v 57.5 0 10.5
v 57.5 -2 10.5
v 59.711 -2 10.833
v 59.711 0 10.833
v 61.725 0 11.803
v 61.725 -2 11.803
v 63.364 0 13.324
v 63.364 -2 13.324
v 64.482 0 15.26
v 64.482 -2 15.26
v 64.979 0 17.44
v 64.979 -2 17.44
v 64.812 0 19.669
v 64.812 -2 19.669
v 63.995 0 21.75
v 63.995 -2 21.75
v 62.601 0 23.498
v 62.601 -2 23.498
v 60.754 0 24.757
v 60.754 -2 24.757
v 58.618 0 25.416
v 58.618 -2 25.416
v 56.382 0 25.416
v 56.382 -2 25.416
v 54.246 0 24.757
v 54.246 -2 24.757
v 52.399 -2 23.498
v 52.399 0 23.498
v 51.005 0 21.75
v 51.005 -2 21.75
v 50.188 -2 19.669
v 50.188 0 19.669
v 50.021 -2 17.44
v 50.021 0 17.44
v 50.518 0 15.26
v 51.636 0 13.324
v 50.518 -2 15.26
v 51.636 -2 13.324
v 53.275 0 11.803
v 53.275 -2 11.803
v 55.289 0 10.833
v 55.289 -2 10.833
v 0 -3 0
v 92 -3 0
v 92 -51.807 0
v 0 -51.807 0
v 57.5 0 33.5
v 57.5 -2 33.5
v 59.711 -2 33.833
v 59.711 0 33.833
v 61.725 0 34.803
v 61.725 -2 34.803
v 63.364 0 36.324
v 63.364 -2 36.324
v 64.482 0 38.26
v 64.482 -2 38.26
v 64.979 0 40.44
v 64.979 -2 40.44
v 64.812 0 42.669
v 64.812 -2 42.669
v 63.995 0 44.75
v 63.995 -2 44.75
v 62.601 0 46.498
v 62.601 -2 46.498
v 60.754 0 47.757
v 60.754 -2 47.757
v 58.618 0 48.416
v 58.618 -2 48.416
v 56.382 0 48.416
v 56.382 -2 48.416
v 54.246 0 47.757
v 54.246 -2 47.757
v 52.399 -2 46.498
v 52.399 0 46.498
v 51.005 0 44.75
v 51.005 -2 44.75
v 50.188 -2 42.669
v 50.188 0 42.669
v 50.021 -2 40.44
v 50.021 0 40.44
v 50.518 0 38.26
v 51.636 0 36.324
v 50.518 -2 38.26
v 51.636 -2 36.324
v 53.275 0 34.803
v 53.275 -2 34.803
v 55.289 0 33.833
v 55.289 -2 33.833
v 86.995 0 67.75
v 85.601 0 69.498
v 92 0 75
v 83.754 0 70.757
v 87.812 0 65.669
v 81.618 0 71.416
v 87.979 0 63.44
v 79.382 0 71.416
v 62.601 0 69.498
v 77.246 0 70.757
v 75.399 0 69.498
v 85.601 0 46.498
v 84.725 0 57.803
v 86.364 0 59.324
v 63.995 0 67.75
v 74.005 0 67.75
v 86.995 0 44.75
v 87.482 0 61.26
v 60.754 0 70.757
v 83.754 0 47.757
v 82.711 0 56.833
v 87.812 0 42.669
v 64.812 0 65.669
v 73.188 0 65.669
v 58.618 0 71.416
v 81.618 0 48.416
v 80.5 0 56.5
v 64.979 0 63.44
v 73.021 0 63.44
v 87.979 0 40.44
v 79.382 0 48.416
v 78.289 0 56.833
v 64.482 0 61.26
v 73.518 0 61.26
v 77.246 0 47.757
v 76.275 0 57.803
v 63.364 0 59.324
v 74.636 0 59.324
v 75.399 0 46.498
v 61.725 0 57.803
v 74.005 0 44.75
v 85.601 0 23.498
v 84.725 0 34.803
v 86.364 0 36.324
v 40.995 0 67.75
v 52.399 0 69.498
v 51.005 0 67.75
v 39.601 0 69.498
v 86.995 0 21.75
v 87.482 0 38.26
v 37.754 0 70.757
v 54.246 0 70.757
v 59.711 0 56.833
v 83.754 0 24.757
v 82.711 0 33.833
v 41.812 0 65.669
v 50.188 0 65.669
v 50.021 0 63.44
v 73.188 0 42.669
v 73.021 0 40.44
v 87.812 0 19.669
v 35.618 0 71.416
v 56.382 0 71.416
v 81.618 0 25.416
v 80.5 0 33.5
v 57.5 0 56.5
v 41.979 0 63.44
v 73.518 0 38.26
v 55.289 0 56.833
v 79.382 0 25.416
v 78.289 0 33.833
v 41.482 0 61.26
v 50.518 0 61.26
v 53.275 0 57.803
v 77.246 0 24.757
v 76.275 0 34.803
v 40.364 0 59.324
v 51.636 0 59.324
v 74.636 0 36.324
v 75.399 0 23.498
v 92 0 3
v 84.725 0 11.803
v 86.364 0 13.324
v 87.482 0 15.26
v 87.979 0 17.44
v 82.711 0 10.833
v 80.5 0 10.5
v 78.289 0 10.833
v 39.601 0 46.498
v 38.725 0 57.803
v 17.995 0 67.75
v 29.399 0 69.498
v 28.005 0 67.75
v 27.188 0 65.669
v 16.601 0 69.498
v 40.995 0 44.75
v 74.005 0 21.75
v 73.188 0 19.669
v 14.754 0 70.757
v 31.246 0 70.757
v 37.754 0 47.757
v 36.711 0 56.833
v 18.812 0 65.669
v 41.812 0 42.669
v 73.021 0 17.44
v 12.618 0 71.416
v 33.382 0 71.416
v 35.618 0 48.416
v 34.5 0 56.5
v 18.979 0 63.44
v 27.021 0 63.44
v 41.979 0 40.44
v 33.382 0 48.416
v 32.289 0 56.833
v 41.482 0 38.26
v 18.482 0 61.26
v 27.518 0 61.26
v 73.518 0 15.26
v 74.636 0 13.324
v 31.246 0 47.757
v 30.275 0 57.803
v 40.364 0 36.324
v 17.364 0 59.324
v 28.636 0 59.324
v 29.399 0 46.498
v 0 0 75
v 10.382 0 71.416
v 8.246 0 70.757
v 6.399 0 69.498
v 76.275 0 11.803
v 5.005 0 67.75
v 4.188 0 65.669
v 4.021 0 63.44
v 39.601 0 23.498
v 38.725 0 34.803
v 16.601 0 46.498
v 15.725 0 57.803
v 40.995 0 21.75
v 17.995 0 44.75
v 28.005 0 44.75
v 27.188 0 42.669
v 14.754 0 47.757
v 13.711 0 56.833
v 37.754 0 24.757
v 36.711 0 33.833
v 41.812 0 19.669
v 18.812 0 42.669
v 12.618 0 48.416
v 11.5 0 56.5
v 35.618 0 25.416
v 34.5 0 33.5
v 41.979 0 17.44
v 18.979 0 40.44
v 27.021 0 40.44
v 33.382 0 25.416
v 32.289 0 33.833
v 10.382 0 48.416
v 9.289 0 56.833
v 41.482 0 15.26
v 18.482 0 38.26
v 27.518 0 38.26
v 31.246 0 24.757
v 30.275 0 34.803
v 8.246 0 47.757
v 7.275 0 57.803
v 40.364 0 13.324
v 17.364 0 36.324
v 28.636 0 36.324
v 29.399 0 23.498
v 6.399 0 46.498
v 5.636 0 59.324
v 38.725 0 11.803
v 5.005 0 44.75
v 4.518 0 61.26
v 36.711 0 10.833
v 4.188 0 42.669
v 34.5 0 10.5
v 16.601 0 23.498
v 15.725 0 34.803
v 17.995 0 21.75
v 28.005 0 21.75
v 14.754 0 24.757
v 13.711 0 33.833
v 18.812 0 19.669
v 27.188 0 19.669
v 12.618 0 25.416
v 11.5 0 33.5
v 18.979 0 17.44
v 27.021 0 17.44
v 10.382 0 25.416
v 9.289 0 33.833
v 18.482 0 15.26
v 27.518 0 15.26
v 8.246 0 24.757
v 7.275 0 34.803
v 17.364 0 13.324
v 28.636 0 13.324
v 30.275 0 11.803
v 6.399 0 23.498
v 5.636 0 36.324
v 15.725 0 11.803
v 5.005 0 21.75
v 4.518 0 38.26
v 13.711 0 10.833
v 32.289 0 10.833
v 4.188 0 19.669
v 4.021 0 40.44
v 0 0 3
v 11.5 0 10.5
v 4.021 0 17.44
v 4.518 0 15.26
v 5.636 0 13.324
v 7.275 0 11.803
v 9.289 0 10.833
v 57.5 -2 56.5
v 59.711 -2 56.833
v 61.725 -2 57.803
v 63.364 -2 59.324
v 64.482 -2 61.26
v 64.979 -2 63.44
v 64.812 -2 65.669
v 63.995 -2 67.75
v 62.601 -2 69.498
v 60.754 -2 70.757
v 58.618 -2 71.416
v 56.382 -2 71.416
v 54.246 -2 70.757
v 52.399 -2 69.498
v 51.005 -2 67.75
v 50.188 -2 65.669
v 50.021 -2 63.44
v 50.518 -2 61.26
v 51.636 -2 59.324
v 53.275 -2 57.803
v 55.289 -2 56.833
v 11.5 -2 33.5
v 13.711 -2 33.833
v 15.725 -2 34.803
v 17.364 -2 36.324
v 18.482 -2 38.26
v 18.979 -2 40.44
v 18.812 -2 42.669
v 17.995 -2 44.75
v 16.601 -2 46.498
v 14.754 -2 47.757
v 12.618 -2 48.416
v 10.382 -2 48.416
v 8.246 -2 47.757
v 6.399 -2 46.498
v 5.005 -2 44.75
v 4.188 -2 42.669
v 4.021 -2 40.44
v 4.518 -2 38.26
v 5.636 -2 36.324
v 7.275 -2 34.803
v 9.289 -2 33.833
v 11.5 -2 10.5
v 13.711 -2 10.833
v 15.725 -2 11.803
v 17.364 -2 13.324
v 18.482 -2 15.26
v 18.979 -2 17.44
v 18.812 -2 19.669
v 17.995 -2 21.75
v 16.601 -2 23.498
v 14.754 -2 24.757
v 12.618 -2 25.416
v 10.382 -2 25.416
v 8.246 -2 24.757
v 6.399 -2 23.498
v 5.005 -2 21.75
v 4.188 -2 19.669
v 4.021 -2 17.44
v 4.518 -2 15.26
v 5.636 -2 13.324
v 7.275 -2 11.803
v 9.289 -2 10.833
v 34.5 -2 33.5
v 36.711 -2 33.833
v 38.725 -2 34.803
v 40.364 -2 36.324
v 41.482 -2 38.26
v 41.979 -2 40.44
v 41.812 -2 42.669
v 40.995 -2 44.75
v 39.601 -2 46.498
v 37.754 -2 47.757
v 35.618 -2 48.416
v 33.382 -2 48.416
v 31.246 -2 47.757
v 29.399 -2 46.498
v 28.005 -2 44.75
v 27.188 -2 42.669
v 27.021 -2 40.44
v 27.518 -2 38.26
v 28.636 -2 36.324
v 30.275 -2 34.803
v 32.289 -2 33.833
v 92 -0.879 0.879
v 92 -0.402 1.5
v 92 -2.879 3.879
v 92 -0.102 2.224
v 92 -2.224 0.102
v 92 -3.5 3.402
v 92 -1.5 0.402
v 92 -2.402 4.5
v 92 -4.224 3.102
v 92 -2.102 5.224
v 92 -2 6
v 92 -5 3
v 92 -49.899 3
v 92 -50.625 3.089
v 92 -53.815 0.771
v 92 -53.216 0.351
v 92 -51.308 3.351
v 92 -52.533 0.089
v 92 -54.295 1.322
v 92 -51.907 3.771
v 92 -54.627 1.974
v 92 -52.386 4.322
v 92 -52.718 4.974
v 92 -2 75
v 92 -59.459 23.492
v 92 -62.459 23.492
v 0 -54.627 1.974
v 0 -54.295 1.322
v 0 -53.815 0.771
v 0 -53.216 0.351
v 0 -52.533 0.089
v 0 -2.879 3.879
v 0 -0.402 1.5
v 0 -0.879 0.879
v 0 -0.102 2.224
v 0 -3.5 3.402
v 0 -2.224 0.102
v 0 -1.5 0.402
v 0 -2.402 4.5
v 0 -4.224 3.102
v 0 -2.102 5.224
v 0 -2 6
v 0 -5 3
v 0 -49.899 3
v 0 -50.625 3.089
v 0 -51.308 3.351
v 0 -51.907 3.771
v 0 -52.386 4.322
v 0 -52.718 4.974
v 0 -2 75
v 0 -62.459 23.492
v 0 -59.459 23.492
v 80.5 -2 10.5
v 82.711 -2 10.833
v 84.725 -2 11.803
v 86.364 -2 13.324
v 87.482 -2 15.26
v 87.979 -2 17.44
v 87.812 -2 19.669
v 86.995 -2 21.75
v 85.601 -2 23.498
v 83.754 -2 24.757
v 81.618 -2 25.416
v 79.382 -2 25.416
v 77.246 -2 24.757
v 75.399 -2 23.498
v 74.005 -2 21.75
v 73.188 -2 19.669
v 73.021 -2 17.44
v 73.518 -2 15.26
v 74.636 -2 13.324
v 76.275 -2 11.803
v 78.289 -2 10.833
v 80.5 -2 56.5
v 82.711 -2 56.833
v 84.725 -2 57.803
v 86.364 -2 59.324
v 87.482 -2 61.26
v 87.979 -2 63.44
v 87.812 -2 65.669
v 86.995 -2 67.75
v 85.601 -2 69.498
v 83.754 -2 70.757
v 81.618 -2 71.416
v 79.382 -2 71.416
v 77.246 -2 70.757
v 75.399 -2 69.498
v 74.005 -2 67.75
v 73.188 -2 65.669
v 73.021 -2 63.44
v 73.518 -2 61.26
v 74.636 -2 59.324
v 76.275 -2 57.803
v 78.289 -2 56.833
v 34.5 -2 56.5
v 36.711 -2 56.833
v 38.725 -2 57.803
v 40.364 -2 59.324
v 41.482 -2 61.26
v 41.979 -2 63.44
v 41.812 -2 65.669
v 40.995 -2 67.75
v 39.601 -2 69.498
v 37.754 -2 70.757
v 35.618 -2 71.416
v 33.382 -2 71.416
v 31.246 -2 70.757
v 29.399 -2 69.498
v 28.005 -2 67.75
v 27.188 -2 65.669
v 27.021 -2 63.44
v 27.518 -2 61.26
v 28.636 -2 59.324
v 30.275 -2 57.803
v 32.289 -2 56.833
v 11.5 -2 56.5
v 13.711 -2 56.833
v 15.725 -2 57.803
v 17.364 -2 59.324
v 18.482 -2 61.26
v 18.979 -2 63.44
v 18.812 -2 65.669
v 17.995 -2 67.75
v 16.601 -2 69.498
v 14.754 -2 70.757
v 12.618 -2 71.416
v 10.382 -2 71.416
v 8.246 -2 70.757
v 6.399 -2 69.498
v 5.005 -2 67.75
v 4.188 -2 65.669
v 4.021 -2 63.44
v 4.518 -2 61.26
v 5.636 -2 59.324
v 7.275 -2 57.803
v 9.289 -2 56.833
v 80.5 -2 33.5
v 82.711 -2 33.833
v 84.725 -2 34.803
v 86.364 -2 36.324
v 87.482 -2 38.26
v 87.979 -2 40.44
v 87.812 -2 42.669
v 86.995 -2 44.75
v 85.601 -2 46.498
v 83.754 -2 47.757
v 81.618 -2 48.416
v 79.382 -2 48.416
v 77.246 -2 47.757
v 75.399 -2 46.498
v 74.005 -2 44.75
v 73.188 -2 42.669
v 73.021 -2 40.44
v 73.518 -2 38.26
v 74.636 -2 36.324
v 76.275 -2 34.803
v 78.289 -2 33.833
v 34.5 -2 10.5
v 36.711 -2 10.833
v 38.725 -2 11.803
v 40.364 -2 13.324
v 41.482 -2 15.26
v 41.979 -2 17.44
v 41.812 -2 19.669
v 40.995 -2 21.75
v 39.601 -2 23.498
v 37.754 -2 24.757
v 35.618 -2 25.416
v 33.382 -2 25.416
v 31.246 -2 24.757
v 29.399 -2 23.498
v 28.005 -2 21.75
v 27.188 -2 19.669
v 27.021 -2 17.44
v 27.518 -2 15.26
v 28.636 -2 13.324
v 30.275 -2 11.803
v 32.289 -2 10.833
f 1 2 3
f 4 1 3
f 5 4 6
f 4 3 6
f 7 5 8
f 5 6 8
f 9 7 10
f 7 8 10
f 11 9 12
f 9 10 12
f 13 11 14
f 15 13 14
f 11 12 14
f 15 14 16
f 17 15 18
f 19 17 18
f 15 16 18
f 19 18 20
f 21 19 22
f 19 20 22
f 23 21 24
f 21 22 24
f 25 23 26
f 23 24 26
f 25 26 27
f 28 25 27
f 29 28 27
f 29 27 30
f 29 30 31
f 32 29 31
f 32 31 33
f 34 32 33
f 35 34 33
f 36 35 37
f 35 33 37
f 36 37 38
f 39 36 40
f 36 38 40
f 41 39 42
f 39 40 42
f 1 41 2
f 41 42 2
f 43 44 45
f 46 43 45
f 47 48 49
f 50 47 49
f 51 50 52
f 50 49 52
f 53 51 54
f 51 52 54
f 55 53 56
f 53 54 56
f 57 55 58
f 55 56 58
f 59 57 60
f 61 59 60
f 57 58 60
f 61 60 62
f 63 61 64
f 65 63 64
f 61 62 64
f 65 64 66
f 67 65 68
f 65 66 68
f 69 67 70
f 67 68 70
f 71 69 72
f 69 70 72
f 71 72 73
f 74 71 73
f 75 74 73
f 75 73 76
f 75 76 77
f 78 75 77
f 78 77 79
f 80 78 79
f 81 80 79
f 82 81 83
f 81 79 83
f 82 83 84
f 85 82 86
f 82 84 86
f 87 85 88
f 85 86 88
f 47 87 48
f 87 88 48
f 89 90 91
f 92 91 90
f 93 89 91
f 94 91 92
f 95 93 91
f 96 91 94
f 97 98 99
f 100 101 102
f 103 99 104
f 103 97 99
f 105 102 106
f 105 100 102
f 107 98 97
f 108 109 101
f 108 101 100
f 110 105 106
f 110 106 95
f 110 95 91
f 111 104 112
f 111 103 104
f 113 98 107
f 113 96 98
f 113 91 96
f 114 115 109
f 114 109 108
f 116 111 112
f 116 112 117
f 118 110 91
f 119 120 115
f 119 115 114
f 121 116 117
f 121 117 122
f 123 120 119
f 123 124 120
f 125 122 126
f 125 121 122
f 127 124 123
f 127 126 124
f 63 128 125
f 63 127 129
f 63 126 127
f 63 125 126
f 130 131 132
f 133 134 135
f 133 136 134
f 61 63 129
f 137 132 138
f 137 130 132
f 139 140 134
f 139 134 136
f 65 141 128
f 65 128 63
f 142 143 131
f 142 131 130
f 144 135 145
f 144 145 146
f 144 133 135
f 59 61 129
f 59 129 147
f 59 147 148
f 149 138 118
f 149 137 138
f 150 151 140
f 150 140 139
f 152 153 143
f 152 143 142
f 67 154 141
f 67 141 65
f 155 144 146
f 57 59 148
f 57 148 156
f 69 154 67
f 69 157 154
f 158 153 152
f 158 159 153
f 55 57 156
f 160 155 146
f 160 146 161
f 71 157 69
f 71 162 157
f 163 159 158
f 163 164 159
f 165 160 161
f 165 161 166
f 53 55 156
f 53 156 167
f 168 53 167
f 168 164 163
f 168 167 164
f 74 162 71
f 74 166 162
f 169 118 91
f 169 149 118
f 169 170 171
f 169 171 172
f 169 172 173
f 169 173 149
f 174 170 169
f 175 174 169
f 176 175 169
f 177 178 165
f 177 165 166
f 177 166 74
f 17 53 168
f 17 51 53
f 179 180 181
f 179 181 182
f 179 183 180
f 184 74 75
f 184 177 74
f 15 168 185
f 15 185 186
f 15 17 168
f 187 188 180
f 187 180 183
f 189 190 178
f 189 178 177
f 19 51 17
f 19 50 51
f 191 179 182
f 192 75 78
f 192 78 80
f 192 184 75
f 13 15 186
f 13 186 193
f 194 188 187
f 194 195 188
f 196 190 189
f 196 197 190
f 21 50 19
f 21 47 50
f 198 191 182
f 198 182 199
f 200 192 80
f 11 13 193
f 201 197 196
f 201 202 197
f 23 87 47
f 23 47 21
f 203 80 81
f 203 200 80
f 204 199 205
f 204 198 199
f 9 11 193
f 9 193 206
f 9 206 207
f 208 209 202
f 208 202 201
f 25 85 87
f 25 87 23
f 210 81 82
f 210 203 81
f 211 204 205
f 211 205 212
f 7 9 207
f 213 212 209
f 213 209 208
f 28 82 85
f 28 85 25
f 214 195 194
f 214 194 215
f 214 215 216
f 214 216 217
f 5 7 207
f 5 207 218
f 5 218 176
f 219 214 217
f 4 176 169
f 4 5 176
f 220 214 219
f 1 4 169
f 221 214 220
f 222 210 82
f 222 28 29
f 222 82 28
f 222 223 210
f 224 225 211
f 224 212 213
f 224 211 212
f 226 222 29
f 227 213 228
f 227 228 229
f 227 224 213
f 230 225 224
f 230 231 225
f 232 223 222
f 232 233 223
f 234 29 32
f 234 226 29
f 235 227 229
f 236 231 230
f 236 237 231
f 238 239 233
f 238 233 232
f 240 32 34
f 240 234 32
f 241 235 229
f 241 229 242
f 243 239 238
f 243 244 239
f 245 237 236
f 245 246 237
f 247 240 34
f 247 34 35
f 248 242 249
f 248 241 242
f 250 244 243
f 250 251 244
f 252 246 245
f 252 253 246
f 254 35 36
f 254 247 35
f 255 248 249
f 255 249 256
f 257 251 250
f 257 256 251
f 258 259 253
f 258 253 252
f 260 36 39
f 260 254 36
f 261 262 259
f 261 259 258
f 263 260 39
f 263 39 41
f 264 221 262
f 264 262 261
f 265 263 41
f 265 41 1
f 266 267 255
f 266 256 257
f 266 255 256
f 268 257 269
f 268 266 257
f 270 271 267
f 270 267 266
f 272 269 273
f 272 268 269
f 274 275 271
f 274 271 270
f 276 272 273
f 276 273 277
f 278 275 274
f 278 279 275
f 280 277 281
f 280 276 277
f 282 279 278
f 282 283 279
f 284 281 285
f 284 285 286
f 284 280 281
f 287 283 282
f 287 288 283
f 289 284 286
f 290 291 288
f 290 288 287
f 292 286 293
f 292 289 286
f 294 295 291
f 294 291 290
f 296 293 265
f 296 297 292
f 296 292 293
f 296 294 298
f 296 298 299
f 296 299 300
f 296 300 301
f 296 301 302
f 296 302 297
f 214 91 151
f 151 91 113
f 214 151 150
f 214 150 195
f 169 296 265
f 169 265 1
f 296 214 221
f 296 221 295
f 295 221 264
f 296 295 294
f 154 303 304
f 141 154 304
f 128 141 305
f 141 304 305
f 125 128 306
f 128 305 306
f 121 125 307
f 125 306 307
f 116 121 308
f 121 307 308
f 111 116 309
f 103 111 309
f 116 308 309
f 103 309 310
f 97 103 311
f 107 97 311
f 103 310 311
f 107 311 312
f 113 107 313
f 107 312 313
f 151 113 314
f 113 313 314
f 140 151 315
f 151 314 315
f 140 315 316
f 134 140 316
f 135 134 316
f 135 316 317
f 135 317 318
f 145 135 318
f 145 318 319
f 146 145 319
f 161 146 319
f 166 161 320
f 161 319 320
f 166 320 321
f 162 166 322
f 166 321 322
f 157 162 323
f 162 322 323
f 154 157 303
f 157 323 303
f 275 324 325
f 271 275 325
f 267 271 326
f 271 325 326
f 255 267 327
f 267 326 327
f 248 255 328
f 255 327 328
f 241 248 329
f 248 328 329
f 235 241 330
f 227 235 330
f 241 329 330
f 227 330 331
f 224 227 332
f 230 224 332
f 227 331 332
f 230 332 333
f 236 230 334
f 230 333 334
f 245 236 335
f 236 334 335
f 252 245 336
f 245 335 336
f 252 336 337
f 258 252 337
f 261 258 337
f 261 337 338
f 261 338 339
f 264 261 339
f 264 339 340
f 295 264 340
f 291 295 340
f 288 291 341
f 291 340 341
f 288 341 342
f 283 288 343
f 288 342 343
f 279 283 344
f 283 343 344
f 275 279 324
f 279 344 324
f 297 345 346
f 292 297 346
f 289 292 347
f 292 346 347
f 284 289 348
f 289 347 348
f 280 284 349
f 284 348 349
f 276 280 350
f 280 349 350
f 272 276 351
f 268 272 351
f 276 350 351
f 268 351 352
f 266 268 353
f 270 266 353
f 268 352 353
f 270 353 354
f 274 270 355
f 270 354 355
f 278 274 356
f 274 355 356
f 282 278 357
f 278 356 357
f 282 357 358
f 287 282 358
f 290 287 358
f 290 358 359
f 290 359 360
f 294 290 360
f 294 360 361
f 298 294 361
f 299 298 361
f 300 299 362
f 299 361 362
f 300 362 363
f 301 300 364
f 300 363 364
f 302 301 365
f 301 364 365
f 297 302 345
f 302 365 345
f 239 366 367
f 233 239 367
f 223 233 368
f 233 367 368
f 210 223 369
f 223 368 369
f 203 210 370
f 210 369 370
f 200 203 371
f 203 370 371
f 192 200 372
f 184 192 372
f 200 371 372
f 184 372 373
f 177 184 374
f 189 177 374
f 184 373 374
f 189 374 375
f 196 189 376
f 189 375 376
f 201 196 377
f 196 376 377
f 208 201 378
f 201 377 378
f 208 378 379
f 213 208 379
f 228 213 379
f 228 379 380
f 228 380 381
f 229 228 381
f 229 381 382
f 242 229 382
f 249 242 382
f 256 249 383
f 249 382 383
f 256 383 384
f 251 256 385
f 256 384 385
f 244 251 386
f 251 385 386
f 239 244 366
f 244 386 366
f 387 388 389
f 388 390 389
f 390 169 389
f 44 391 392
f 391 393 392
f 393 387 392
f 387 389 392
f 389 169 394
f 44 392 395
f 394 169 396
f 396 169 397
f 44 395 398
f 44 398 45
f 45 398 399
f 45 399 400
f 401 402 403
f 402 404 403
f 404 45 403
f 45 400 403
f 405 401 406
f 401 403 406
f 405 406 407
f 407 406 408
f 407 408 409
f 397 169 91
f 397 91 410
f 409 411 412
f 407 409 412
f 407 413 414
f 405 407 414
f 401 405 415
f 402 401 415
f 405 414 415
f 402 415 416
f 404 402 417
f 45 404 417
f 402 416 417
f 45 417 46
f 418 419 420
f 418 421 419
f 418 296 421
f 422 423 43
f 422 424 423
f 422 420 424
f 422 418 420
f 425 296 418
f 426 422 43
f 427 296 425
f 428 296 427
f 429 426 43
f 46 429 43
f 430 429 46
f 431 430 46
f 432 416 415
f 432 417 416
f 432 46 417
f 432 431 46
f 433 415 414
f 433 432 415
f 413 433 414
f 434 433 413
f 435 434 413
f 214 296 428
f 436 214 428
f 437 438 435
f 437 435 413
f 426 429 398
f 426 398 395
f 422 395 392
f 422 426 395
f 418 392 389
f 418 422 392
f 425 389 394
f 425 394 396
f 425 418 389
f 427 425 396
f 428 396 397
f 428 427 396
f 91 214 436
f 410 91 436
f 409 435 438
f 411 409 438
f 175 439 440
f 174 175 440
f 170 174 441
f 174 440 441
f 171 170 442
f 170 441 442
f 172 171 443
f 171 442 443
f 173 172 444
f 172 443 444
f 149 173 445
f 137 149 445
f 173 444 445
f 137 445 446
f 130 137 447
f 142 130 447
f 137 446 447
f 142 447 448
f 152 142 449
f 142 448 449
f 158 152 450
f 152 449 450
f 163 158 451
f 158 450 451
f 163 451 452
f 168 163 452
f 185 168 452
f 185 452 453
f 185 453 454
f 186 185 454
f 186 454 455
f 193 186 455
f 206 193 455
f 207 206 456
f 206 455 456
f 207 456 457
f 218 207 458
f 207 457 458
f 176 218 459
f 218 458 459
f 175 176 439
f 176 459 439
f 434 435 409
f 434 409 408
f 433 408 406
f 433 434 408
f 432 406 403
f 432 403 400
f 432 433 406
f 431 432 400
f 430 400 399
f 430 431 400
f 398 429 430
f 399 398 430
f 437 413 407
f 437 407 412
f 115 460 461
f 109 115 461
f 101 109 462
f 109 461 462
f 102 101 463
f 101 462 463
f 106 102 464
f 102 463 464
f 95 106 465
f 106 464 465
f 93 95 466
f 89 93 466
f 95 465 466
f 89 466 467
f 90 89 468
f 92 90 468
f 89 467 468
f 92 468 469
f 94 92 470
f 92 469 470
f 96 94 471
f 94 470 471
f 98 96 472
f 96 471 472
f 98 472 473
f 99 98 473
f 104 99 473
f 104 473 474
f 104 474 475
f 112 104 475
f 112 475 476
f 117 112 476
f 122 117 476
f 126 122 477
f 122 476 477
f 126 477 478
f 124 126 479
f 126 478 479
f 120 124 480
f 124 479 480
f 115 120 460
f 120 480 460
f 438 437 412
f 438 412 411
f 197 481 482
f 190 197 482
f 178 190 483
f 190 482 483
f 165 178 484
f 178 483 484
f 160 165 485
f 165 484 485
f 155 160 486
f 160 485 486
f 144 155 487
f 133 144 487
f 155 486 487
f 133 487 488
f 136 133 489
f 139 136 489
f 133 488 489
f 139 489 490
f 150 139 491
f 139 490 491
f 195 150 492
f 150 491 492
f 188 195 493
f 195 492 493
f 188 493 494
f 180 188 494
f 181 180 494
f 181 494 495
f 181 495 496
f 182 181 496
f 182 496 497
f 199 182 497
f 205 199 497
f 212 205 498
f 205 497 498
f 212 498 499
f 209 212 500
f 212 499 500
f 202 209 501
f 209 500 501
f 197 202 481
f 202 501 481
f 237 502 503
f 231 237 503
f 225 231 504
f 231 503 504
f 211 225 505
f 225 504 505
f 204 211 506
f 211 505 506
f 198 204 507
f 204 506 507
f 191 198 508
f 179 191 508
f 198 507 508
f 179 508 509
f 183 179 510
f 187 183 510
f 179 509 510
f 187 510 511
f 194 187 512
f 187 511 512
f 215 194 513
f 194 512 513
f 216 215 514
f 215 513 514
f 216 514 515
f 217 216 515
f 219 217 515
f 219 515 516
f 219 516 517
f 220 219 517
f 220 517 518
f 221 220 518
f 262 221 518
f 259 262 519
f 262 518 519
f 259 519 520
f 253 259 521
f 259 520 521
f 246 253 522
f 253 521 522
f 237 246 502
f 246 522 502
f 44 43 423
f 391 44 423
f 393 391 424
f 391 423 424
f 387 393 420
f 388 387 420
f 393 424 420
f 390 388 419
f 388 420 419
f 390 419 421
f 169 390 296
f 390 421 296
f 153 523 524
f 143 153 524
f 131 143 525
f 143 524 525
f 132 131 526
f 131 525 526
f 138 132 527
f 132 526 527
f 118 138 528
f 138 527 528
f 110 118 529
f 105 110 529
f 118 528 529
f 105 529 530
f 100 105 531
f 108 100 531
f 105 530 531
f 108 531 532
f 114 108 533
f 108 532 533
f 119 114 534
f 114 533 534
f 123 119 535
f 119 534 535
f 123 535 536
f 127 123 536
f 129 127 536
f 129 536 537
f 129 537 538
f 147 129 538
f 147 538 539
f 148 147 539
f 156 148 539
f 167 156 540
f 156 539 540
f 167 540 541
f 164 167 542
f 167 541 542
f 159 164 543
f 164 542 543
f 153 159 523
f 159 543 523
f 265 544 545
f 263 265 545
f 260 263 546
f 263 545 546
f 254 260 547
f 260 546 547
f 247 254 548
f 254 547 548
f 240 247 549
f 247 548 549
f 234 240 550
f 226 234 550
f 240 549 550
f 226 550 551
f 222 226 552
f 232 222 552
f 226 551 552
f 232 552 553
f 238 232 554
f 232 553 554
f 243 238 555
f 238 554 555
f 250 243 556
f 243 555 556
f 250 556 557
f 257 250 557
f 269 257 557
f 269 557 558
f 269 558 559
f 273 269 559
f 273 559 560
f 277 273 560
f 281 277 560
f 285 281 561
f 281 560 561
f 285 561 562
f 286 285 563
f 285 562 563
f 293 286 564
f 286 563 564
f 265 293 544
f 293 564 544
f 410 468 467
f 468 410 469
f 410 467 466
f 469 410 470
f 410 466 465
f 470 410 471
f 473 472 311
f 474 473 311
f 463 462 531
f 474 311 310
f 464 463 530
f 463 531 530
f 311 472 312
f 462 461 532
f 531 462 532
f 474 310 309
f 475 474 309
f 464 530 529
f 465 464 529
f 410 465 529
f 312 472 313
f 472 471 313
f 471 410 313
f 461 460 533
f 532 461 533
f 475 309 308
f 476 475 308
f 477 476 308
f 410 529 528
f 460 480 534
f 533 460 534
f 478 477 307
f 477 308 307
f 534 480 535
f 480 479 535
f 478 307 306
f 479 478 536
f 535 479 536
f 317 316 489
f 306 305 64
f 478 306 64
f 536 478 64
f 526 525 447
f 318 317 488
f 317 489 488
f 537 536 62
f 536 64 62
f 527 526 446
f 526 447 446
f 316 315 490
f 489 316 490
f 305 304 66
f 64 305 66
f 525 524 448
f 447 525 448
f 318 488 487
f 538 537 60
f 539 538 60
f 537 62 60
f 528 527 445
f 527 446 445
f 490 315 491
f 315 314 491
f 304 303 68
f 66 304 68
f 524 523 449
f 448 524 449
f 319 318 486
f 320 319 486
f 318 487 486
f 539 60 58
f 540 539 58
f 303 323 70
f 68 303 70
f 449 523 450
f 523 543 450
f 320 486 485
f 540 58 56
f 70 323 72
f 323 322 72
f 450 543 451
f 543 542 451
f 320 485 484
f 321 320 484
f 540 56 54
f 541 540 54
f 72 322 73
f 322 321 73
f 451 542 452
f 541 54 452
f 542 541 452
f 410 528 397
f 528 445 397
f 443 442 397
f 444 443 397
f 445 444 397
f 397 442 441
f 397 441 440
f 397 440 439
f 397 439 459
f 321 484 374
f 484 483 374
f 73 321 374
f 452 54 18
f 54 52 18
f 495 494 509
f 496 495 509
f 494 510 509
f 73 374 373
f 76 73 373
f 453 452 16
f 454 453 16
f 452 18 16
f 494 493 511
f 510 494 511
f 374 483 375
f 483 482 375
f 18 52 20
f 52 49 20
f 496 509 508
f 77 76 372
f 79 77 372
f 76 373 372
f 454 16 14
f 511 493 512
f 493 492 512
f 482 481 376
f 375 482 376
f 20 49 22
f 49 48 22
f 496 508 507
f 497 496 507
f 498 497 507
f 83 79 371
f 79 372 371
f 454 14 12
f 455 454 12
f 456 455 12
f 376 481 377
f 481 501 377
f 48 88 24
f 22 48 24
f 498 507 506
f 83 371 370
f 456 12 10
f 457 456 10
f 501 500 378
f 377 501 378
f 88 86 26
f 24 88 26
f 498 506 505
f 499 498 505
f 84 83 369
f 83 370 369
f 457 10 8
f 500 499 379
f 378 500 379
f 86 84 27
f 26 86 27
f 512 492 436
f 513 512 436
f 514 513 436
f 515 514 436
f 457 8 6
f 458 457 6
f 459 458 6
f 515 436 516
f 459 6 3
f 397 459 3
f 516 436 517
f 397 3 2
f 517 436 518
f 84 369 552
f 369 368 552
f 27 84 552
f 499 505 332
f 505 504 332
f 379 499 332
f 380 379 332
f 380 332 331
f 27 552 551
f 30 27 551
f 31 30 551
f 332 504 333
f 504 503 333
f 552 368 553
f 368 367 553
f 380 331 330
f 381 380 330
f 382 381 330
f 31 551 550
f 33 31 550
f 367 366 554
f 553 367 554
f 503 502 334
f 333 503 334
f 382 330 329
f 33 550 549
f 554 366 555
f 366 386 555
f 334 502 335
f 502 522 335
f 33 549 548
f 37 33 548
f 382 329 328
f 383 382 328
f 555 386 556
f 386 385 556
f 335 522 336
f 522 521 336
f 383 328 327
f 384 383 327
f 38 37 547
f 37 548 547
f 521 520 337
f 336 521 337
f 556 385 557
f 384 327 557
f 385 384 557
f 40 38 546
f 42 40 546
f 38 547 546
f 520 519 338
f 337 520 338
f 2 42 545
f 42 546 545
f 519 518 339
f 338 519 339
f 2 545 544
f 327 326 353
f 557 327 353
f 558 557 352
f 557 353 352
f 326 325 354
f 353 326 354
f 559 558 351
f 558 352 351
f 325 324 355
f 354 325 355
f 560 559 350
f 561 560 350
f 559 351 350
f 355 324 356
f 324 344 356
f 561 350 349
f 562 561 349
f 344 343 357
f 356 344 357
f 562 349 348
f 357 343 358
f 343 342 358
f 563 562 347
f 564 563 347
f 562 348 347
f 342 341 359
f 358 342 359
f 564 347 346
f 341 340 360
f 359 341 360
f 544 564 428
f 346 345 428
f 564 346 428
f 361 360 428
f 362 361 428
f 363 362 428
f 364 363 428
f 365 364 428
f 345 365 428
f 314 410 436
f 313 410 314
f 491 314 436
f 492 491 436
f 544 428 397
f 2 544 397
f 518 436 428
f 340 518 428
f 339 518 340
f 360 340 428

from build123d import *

# Parameters (mm, degrees)
PAD_DEPTH    = 92
SKETCH001_R  = 7.5
POCKET_DEPTH = 2


with BuildPart() as part:
    # Sketch → Pad (new body)
    with BuildSketch(Plane.YZ):
        with BuildLine():
            Line((0, 75), (0, 3))
            ThreePointArc((-3, 0), (-0.87868, 0.87868), (0, 3))
            Line((-3, 0), (-51.807467, 0))
            ThreePointArc((-54.626545, 1.97394), (-53.528196, 0.542544), (-51.807467, 0))
            Line((-54.626545, 1.97394), (-62.458589, 23.492317))
            Line((-62.458589, 23.492317), (-59.458589, 23.492317))
            Line((-52.718455, 4.97394), (-59.458589, 23.492317))
            ThreePointArc((-52.718455, 4.97394), (-51.620107, 3.542544), (-49.899377, 3))
            Line((-5, 3), (-49.899377, 3))
            ThreePointArc((-5, 3), (-2.87868, 3.87868), (-2, 6))
            Line((-2, 75), (-2, 6))
            Line((0, 75), (-2, 75))
        make_face()
    extrude(amount=PAD_DEPTH)

    # Sketch001 (on Face12 of Pad) → Pocket (cut)
    with BuildSketch(Plane(origin=(0, -2, 0), x_dir=(0, 0, -1), z_dir=(0, -1, 0))):
        with Locations((-64, 11.5)):
            Circle(SKETCH001_R)
        with Locations((-41, 11.5)):
            Circle(SKETCH001_R)
        with Locations((-18, 11.5)):
            Circle(SKETCH001_R)
        with Locations((-64, 34.5)):
            Circle(SKETCH001_R)
        with Locations((-41, 34.5)):
            Circle(SKETCH001_R)
        with Locations((-18, 34.5)):
            Circle(SKETCH001_R)
        with Locations((-64, 57.5)):
            Circle(SKETCH001_R)
        with Locations((-41, 57.5)):
            Circle(SKETCH001_R)
        with Locations((-18, 57.5)):
            Circle(SKETCH001_R)
        with Locations((-64, 80.5)):
            Circle(SKETCH001_R)
        with Locations((-41, 80.5)):
            Circle(SKETCH001_R)
        with Locations((-18, 80.5)):
            Circle(SKETCH001_R)
    extrude(amount=-POCKET_DEPTH, mode=Mode.SUBTRACT)


solid = part.part
